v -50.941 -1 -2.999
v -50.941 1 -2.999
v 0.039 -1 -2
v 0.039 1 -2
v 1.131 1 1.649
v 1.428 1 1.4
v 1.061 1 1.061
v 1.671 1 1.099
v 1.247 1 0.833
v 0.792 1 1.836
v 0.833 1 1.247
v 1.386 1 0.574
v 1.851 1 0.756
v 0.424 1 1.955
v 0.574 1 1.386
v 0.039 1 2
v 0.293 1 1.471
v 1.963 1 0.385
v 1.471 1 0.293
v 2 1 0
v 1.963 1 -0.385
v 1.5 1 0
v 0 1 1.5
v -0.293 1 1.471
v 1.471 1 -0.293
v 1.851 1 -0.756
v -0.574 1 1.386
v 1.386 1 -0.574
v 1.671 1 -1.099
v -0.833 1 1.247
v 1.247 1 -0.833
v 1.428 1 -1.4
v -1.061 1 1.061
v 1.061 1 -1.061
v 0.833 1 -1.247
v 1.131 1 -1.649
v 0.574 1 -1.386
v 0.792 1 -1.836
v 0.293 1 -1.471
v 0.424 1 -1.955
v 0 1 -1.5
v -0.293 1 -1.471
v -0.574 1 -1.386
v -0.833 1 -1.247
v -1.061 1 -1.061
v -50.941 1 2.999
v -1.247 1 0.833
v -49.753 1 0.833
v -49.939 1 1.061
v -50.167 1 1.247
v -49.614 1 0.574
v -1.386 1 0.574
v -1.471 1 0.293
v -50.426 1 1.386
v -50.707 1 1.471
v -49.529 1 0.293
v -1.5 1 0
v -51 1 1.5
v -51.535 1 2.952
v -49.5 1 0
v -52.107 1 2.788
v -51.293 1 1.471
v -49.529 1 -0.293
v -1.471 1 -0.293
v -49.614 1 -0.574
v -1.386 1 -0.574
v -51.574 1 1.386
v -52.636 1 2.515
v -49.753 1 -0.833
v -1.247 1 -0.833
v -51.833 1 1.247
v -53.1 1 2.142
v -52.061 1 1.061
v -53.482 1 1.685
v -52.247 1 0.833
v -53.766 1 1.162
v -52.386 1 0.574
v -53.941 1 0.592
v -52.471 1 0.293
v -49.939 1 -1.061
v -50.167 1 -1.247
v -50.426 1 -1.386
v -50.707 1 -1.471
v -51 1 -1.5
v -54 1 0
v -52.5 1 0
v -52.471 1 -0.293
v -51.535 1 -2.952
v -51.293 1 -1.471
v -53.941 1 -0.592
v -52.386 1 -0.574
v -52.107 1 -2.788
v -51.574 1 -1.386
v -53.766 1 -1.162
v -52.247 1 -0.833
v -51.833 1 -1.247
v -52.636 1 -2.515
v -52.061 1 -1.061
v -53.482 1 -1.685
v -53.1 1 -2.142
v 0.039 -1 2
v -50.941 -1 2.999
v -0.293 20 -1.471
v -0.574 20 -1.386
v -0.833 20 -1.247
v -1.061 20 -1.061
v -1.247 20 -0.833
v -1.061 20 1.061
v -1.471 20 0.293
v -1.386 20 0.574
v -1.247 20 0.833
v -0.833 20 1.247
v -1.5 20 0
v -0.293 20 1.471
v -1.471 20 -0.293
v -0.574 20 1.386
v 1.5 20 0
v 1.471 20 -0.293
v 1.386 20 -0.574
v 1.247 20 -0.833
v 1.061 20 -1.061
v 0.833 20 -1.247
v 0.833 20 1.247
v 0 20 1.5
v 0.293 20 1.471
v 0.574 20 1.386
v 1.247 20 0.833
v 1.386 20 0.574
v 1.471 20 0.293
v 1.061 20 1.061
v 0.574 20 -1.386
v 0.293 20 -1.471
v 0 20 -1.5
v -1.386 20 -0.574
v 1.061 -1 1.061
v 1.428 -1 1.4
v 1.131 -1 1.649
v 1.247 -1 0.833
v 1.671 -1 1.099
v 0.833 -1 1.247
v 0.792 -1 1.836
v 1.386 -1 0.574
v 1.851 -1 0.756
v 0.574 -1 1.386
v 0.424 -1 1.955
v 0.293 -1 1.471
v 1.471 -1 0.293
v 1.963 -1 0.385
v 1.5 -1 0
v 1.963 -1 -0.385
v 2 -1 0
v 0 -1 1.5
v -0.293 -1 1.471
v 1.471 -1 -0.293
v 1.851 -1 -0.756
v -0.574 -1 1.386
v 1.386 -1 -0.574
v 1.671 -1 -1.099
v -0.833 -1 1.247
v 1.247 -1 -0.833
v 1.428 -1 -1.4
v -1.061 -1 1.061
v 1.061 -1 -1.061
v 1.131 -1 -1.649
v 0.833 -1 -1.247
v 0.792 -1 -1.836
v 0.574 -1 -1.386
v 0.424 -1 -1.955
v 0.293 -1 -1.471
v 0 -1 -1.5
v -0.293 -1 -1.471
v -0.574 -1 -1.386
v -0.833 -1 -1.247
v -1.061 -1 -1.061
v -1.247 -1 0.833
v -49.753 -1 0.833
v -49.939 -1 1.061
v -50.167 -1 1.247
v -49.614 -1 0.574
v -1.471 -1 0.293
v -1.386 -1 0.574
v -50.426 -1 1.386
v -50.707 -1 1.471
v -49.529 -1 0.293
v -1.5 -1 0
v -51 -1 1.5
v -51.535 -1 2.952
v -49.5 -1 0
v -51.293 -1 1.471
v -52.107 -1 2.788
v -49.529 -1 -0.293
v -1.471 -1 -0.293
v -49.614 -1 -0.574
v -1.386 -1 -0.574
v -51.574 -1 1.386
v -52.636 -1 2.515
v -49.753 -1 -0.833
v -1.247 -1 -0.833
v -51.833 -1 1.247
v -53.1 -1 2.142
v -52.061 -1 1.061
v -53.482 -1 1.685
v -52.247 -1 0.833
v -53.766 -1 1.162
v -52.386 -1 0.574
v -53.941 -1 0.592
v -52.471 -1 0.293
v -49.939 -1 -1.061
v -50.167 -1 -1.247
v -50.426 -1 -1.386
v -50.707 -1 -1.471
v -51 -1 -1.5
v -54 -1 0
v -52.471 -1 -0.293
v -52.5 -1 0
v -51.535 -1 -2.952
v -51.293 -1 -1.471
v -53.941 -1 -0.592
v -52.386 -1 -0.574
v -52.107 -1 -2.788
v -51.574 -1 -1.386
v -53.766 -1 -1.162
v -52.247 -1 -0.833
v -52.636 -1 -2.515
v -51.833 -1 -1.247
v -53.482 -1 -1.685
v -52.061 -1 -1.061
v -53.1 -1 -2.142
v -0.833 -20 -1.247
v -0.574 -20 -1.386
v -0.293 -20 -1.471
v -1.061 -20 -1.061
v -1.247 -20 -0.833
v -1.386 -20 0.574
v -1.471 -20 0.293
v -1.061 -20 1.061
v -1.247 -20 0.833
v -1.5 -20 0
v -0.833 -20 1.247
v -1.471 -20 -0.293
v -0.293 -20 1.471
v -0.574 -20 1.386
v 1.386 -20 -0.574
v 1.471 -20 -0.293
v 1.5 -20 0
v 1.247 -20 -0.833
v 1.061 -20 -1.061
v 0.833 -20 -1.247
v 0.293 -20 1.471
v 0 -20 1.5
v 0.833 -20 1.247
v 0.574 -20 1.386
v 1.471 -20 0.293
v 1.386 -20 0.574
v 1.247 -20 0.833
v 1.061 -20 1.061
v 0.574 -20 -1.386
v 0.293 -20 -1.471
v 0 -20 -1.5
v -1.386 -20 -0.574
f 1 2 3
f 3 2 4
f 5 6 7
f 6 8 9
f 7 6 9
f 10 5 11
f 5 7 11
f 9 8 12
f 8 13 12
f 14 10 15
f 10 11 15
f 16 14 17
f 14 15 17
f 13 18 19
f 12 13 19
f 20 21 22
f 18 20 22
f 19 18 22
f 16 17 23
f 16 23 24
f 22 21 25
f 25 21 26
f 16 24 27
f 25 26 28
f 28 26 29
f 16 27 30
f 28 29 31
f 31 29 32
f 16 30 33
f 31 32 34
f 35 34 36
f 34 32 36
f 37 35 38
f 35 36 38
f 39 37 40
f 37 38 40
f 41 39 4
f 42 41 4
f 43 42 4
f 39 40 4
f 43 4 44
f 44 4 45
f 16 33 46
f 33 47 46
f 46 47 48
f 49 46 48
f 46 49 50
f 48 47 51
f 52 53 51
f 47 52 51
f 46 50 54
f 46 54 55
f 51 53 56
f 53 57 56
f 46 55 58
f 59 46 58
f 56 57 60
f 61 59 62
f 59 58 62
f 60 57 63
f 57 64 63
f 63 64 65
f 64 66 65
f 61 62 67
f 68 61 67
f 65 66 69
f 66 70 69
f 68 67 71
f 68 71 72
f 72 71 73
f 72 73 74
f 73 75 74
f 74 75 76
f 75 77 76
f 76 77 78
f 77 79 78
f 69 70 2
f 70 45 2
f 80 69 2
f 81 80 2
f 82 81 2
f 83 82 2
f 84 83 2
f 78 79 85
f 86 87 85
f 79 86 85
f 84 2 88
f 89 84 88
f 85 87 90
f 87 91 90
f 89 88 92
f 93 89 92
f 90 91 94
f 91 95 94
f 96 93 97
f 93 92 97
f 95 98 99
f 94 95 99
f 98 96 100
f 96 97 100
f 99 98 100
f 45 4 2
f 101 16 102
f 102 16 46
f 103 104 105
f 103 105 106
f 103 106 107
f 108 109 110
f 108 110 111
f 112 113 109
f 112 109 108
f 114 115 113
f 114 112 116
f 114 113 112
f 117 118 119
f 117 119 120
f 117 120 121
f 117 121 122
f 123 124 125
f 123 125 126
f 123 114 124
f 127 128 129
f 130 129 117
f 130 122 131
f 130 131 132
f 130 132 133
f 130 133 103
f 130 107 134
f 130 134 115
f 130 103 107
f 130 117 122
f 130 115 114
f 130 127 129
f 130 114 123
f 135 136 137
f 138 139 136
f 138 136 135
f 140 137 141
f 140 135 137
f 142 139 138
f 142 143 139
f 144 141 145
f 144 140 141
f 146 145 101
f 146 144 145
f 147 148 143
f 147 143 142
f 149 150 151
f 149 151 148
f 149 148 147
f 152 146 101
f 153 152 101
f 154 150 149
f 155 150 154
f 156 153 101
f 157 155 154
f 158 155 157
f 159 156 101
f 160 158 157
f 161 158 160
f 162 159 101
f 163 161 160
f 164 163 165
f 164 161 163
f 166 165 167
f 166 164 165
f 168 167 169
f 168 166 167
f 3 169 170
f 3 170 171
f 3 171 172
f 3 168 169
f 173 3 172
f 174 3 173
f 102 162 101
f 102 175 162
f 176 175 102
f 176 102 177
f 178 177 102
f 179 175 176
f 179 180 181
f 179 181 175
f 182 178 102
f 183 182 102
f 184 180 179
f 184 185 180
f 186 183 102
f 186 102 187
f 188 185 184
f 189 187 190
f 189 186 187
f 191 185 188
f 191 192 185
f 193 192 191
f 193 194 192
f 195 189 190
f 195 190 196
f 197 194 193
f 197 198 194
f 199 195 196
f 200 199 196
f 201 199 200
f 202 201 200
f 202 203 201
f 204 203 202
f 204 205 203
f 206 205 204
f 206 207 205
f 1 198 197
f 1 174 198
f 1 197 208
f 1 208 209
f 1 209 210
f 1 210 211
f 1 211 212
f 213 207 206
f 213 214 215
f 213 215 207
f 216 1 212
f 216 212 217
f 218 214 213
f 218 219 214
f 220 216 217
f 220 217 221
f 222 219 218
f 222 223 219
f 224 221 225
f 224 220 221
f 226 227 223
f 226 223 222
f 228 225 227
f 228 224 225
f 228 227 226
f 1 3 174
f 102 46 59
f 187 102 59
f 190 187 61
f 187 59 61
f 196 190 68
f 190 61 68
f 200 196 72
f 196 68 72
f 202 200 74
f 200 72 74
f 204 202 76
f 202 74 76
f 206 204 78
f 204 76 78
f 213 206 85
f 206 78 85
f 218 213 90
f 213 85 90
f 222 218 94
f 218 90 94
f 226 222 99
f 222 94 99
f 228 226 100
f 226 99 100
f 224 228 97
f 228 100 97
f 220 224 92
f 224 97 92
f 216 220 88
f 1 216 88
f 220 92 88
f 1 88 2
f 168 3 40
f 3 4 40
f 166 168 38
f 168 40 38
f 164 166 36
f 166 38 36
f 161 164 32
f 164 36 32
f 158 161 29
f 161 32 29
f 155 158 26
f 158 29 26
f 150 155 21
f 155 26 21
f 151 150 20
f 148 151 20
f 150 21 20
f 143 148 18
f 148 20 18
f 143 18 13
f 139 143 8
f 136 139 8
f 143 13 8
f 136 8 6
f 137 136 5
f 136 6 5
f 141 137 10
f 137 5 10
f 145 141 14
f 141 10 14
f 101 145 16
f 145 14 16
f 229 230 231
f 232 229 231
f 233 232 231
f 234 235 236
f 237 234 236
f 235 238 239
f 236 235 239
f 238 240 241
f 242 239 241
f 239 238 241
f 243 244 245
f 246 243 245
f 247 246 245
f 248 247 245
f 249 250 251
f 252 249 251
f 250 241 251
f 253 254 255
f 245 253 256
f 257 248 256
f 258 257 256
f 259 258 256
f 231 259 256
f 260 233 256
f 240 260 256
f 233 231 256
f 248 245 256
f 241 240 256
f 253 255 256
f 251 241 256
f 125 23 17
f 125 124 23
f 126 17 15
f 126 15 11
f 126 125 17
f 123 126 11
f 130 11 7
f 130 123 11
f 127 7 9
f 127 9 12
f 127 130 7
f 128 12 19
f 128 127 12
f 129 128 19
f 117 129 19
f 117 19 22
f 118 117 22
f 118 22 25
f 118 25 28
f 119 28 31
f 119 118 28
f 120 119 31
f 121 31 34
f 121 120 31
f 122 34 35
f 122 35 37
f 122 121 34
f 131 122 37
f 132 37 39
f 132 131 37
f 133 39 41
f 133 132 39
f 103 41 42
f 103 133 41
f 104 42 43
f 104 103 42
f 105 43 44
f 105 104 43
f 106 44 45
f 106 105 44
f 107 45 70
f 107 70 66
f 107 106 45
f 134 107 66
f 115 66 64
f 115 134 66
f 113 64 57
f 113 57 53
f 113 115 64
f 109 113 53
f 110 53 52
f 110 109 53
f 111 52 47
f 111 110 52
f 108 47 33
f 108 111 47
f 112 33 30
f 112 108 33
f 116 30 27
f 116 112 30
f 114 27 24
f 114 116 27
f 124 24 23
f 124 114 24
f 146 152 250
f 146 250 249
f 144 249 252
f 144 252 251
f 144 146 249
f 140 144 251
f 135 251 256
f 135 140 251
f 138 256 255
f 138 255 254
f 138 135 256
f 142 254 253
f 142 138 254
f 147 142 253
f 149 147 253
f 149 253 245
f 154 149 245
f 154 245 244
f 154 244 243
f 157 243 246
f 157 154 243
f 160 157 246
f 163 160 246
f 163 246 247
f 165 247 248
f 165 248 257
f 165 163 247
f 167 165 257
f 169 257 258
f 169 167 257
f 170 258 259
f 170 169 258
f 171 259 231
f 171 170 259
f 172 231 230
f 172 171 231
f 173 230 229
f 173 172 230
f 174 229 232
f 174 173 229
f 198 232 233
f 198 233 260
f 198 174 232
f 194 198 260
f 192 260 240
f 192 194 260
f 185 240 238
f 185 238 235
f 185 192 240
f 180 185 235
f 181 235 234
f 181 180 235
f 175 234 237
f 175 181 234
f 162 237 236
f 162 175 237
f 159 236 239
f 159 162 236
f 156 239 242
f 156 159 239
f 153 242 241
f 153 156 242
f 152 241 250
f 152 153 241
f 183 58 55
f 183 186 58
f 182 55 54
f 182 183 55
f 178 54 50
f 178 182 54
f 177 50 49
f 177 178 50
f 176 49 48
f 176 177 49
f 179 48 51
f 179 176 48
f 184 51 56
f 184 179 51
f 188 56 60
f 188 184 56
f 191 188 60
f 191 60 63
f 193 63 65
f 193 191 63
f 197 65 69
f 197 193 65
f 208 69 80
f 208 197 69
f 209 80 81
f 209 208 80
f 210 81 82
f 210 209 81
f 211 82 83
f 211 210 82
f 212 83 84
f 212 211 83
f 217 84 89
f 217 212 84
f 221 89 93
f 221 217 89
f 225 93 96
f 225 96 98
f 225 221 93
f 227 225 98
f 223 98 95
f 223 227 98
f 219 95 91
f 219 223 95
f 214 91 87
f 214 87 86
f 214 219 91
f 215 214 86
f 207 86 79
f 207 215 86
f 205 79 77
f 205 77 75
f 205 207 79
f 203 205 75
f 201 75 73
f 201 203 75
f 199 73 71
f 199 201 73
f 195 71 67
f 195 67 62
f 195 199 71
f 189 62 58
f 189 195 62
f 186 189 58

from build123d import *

# Parameters (mm, degrees)
SKETCH1_R           = 1.5
BOSS_EXTRUDE1_DEPTH = 20
SKETCH2_R           = 1.5
BOSS_EXTRUDE2_DEPTH = 1


with BuildPart() as part:
    # Sketch1 → Boss-Extrude1 (new, symmetric)
    with BuildSketch(Plane(origin=(0, 0, 0), x_dir=(1, 0, 0), z_dir=(0, 1, 0))):
        with Locations(Location((0, 0, 0), (0, 0, 270))):
            Circle(SKETCH1_R)
    extrude(amount=BOSS_EXTRUDE1_DEPTH, both=True)

    # Sketch2 → Boss-Extrude2 (add, symmetric)
    with BuildSketch(Plane(origin=(0, 0, 0), x_dir=(1, 0, 0), z_dir=(0, 1, 0))):
        with BuildLine():
            Line((-50.941176471, 2.999423243), (0.039215686, 1.999615496))
            ThreePointArc((0.039215686, 1.999615496), (2, 0), (0.039215686, -1.999615496))
            Line((0.039215686, -1.999615496), (-50.941176471, -2.999423243))
            ThreePointArc((-50.941176471, -2.999423243), (-54, 0), (-50.941176471, 2.999423243))
        make_face()
        with Locations(Location((-51, 0, 0), (0, 0, 270))):
            Circle(SKETCH2_R, mode=Mode.SUBTRACT)
    extrude(amount=BOSS_EXTRUDE2_DEPTH, both=True)


solid = part.part
